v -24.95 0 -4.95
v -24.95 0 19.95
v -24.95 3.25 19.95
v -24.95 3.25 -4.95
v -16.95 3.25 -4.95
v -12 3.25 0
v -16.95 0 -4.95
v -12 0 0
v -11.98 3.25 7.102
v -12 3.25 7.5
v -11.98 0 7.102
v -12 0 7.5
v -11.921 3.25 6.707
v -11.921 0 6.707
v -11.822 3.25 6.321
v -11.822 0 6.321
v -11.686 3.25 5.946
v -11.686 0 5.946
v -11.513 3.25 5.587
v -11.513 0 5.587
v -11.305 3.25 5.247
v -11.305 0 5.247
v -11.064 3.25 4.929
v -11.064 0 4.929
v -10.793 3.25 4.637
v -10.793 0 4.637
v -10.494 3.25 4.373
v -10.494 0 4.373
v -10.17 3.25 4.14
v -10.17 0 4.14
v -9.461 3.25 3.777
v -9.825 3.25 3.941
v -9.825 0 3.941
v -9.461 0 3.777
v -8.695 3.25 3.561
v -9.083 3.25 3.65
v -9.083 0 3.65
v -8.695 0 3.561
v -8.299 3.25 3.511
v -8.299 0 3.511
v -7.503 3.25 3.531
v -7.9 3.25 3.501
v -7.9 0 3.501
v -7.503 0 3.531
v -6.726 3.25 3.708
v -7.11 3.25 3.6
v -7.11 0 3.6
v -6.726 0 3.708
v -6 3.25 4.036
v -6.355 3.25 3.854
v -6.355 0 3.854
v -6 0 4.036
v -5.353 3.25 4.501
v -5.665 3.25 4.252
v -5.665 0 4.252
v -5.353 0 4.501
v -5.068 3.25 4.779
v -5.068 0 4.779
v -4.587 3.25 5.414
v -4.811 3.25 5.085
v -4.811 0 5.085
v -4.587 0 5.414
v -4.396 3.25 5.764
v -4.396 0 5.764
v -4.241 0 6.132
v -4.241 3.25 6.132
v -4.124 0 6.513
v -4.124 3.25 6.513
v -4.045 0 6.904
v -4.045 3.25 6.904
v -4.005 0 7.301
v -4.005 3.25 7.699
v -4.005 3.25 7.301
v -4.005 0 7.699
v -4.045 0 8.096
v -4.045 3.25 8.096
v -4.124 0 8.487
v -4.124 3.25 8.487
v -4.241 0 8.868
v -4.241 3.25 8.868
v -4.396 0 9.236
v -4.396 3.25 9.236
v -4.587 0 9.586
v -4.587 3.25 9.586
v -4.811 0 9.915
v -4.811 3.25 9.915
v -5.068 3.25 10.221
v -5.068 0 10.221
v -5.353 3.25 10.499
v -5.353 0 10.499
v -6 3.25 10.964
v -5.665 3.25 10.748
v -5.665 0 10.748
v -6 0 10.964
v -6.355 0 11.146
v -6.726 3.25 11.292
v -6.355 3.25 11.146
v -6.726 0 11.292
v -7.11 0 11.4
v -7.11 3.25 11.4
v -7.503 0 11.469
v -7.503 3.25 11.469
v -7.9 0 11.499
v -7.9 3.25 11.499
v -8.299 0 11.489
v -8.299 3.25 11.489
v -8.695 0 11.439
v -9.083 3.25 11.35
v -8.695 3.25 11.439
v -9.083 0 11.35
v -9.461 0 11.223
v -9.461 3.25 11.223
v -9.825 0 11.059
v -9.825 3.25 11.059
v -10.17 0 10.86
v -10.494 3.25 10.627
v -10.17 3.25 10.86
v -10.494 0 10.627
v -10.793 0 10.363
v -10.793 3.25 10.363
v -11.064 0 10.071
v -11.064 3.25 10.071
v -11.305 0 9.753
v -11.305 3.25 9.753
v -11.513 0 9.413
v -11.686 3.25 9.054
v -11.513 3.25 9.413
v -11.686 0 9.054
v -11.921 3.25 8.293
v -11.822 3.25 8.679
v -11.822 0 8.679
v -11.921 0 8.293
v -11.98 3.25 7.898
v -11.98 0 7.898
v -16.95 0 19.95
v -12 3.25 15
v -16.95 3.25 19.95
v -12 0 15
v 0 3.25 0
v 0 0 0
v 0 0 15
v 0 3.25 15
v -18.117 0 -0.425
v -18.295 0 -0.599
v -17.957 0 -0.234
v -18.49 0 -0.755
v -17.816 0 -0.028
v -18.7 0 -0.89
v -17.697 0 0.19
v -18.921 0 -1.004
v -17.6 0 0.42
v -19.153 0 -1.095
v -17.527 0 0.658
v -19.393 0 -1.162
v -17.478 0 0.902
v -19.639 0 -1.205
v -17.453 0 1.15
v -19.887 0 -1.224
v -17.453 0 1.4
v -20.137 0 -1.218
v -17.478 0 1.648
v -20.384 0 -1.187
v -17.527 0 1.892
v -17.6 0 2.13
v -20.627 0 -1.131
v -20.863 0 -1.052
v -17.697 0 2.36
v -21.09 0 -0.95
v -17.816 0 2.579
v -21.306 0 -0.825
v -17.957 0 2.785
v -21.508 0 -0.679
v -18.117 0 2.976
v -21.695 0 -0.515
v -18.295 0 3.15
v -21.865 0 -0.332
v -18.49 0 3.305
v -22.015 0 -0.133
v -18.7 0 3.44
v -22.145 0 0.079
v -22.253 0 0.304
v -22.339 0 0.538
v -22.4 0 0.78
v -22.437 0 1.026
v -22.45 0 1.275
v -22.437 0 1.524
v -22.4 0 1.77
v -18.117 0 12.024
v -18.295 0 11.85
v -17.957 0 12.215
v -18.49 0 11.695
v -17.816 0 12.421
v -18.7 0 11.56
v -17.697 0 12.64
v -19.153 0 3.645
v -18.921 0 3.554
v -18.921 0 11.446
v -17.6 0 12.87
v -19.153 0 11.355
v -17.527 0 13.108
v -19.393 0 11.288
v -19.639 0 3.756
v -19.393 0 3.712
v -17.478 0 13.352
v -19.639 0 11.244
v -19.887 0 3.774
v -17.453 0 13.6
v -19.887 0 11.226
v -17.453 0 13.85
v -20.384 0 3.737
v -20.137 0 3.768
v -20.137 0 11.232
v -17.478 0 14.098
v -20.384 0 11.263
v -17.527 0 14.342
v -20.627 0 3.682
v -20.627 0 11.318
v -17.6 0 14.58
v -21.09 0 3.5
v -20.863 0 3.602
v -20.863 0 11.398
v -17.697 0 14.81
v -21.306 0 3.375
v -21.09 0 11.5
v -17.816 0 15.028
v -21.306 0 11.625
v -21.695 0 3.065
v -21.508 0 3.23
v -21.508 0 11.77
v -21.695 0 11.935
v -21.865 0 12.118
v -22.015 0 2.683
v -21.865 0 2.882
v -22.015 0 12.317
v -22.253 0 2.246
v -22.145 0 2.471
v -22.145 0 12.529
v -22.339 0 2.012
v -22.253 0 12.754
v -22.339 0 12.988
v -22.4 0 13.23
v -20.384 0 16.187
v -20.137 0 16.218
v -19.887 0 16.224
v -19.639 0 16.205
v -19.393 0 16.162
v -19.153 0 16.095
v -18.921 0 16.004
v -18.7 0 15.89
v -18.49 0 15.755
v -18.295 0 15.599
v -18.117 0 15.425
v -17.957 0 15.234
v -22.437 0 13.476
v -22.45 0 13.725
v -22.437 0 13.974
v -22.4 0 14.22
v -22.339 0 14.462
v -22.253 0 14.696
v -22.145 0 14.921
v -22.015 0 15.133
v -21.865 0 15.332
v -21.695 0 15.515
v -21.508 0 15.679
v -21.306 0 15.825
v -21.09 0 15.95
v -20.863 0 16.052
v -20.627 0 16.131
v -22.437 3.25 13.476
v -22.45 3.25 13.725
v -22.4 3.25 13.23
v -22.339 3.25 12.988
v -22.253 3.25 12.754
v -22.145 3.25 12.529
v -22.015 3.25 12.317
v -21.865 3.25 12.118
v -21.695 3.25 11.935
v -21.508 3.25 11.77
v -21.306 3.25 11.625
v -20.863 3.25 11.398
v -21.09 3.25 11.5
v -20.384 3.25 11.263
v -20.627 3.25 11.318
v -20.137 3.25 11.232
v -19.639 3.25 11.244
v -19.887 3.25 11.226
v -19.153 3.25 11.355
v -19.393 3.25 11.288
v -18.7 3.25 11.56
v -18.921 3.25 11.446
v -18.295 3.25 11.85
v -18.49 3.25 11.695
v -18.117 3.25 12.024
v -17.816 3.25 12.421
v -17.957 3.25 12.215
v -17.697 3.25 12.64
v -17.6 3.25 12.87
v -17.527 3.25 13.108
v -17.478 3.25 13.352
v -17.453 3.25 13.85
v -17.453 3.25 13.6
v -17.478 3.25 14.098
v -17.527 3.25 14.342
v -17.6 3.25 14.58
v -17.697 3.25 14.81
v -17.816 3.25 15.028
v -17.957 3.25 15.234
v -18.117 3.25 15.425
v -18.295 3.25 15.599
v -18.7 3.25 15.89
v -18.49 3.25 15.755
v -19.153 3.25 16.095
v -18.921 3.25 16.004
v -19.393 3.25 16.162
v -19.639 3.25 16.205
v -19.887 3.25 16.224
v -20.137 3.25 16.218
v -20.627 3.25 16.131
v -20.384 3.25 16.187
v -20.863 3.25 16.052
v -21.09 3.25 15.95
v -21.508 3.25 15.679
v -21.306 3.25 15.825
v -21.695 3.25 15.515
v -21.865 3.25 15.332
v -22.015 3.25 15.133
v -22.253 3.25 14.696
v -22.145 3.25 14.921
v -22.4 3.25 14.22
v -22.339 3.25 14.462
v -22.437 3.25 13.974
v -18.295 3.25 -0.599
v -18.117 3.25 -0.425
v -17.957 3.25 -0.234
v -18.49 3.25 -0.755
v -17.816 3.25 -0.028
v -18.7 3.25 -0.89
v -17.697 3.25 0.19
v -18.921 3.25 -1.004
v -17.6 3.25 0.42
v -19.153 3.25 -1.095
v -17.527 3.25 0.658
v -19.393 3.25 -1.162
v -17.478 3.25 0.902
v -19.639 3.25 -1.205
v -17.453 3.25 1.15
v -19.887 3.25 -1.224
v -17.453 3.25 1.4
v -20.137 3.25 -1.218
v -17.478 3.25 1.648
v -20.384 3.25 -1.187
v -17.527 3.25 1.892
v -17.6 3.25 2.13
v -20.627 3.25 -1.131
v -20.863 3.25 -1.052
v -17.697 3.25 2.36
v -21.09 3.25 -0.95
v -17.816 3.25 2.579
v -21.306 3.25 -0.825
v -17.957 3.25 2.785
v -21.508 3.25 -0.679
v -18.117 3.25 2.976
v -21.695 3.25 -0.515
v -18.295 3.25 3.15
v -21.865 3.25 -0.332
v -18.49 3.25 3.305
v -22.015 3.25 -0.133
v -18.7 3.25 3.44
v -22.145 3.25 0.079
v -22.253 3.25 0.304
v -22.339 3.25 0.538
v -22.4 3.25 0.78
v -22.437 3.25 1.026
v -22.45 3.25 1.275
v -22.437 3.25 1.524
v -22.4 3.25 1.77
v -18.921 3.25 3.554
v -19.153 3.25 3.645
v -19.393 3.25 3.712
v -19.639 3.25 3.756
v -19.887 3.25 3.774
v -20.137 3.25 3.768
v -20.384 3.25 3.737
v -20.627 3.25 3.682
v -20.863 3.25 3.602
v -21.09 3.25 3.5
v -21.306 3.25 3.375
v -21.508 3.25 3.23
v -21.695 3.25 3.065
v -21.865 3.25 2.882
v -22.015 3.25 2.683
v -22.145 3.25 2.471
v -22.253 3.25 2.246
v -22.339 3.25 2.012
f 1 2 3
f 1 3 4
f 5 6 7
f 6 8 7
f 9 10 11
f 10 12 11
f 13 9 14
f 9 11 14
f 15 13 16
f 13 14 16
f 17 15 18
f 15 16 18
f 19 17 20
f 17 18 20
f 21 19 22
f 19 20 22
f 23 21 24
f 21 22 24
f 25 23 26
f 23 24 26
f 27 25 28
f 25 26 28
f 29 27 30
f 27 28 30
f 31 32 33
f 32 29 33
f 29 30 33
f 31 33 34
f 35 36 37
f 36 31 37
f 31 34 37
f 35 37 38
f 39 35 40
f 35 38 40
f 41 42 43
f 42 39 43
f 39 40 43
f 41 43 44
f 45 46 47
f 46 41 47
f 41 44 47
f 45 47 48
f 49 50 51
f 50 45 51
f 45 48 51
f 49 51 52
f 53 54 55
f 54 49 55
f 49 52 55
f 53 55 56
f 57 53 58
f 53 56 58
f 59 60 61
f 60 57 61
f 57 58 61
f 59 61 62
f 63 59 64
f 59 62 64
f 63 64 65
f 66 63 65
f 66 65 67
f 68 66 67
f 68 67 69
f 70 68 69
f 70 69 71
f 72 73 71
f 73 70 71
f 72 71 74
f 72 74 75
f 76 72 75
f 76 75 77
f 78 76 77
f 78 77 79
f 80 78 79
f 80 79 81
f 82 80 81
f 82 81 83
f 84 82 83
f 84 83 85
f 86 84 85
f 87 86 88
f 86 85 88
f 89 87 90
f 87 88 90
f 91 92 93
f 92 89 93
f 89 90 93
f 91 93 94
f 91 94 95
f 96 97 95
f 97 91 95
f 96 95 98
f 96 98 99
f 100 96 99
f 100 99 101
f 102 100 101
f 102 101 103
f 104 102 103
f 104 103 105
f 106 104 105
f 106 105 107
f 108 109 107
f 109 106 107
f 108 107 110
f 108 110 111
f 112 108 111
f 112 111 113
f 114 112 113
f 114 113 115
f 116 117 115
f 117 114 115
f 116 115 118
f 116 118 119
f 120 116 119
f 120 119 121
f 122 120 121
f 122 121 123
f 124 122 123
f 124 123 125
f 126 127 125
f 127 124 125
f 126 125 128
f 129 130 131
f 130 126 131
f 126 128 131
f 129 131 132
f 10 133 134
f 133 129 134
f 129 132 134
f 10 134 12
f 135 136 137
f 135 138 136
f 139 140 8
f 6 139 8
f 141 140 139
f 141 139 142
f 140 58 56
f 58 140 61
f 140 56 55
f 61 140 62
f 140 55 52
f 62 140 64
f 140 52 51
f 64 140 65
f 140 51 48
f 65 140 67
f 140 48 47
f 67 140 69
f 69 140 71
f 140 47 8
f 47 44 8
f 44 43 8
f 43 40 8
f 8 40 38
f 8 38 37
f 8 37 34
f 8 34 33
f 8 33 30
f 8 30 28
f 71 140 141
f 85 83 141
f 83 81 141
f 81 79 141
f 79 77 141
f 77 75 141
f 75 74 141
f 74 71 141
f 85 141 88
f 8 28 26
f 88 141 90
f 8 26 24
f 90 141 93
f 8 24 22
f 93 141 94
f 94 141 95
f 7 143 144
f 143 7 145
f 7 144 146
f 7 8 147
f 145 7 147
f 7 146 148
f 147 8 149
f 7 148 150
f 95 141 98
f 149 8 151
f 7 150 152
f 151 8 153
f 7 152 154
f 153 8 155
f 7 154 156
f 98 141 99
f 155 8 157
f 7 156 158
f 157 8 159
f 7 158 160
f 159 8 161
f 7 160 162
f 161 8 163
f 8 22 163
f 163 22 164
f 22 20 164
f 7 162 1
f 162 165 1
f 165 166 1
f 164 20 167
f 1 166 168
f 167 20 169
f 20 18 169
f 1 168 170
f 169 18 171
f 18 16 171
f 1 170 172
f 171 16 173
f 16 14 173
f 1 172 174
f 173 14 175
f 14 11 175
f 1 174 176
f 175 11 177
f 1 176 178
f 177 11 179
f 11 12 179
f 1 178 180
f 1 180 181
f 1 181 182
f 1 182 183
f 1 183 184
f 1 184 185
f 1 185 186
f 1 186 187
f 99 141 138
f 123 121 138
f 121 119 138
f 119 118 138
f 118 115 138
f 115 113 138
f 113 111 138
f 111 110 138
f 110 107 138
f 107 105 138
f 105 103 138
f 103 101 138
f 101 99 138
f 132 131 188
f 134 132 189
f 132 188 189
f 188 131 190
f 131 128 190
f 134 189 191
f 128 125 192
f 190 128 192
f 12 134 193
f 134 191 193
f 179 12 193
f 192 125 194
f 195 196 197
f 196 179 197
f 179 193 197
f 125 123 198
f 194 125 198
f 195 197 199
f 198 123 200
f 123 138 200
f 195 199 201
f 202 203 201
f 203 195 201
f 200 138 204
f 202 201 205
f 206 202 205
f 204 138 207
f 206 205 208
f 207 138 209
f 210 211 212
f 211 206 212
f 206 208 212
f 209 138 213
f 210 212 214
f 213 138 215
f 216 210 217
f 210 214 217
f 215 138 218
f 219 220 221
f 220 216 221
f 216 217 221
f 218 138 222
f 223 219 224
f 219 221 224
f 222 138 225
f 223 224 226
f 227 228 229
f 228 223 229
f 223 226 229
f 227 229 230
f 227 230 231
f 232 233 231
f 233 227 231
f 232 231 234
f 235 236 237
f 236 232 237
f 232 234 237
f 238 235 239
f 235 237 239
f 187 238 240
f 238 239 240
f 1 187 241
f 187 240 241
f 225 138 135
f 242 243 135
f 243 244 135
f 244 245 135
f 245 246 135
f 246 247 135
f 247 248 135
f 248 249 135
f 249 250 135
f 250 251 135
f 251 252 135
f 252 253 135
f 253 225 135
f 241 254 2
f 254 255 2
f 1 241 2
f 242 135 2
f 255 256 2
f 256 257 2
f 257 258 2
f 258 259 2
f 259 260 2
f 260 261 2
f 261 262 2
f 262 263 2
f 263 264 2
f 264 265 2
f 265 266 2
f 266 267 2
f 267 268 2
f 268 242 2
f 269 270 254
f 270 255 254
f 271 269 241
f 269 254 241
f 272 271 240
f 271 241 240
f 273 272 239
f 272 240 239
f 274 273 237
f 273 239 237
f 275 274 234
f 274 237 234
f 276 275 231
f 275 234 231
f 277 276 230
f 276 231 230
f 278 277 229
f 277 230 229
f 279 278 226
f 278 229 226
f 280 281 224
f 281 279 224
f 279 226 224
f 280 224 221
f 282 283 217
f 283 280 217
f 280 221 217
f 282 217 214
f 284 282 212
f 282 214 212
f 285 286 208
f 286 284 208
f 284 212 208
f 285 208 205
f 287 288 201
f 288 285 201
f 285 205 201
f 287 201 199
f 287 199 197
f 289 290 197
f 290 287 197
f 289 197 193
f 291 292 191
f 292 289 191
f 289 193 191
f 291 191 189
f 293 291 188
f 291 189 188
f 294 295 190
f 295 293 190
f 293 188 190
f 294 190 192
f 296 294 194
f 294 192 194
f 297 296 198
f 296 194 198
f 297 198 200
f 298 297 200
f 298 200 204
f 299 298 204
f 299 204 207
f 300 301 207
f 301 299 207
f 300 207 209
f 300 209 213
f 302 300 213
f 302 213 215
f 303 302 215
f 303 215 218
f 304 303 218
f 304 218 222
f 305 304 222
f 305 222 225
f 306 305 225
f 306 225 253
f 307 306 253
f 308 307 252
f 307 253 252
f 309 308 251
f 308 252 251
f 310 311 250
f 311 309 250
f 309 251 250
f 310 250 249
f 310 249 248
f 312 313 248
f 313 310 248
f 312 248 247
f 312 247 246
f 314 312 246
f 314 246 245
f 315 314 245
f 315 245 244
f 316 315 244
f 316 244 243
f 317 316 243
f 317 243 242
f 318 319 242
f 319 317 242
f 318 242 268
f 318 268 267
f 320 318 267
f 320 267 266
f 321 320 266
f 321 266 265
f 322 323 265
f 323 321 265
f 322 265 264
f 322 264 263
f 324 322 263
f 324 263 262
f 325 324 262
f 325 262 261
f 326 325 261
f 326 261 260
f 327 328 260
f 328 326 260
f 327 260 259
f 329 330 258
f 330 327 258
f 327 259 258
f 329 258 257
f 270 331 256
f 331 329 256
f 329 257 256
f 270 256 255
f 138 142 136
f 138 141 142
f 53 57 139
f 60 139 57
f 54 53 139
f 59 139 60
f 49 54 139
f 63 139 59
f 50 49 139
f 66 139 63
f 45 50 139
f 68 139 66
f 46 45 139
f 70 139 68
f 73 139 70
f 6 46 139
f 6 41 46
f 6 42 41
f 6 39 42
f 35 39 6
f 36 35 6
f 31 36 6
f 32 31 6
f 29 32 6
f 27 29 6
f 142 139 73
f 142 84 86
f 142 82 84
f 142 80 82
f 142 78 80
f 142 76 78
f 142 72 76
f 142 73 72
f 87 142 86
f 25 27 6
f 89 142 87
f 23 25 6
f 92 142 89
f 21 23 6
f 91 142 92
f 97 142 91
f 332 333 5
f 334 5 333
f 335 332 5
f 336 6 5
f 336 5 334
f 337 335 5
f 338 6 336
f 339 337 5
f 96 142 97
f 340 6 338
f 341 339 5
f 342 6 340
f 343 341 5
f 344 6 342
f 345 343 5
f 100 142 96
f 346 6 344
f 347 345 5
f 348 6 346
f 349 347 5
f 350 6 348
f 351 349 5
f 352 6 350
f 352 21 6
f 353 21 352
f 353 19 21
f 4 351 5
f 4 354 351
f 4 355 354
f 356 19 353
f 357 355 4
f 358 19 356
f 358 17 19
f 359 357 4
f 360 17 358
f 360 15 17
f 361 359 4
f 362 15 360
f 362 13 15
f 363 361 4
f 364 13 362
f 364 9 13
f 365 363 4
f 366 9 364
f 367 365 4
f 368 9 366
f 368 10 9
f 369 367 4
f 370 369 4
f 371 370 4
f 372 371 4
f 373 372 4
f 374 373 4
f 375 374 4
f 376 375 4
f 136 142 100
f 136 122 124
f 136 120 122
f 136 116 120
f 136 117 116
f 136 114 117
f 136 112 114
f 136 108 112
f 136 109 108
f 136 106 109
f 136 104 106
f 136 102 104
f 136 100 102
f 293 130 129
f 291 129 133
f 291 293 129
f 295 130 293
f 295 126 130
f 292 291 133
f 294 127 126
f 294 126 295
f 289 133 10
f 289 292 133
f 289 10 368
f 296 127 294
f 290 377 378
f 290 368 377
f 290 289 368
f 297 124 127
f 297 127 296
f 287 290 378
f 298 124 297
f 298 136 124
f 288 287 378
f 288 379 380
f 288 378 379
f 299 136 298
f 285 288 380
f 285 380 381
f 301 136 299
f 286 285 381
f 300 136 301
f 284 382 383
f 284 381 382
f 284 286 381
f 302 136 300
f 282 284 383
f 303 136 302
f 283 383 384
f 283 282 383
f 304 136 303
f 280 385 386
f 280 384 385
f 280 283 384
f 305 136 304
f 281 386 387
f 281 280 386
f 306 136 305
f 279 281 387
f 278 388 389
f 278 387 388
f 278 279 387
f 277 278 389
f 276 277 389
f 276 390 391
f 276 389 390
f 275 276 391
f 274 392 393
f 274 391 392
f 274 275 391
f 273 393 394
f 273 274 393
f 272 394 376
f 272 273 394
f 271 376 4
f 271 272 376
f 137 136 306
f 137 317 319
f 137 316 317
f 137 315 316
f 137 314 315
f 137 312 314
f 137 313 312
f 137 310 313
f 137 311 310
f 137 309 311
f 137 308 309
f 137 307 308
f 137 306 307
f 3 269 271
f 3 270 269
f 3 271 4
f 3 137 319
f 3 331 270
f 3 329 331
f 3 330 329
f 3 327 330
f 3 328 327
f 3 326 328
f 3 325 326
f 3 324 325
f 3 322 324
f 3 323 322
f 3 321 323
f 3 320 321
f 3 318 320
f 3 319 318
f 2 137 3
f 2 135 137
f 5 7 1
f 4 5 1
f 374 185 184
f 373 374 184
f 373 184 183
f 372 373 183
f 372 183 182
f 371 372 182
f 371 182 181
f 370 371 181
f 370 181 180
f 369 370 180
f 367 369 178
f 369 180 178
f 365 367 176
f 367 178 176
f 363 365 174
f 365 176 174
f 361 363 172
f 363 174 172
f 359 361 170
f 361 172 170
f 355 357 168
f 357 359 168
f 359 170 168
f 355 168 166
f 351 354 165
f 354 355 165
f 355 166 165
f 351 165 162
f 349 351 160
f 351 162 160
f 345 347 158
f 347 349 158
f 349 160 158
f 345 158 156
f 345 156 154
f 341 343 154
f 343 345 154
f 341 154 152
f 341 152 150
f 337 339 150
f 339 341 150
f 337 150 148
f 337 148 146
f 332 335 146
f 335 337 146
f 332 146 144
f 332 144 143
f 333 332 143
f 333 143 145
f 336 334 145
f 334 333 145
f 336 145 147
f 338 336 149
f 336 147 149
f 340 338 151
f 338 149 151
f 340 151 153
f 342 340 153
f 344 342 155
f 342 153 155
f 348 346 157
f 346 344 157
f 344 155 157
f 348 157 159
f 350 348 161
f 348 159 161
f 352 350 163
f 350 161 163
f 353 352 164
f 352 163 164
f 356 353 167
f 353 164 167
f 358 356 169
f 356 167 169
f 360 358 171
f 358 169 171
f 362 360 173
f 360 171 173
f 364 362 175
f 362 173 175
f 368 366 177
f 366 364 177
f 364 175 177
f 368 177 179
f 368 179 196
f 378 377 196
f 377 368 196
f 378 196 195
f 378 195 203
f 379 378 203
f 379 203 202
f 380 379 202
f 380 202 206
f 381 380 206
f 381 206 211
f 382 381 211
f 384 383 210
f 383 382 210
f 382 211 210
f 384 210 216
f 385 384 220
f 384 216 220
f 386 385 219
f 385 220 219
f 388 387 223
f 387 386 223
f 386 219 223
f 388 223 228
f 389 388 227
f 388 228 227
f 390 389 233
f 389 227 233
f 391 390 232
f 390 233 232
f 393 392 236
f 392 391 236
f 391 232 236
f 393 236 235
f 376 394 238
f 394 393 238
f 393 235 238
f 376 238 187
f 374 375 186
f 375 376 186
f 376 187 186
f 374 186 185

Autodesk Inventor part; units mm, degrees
ref_plane "YZ Plane" through (0, 0, 0) normal (1, 0, 0) x (0, 1, 0)
ref_plane "XZ Plane" through (0, 0, 0) normal (0, 1, 0) x (-1, 0, 0)
ref_plane "XY Plane" through (0, 0, 0) normal (0, 0, 1) x (1, 0, 0)
sketch "Sketch1" plane through (0, 0, 0) normal (0, 1, 0) x (-1, 0, 0)
  point P0 (0, 0)
sketch "Sketch2" plane through (0, 0, 0) normal (0, 1, 0) x (-1, 0, 0)
  line L0 (0, 0) -> (0, 15)
  line L1 (0, 15) -> (12, 15)
  line L2 (12, 15) -> (16.9497, 19.9497)
  line L3 (12, 15) -> (19, 15) construction
  line L4 (16.9497, 19.9497) -> (24.9497, 19.9497)
  line L5 (0, 7.5) -> (15.5, 7.5) construction
  line L6 (0, 0) -> (12, 0)
  line L7 (12, 0) -> (16.9497, -4.9497)
  line L8 (12, 0) -> (19, 0) construction
  line L9 (16.9497, -4.9497) -> (24.9497, -4.9497)
  line L10 (24.9497, 19.9497) -> (24.9497, -4.9497)
  line L11 (0, 7.5) -> (8, 7.5) construction
  circle A0 centre (8, 7.5) radius 4
  line L12 (24.9497, 7.5) -> (19.9497, 7.5) construction
  line L13 (19.9497, 7.5) -> (19.9497, 19.9497) construction
  circle A1 centre (19.9497, 13.7249) radius 2.5
  line L14 (19.9497, 7.5) -> (19.9497, -4.9497) construction
  circle A2 centre (19.9497, 1.2751) radius 2.5
  dimension "d2" = 15
  dimension "d3" = 12
  dimension "d4" = 7
  dimension "d5" = 45
  dimension "d6" = 8
  dimension "d9" = 8
  dimension "d10" = 8
  dimension "d11" = 5
  dimension "d12" = 5
extrude "Extrusion1" add sketch "Sketch2" along normal blind 3.25 contours L0 L1 L2 L4 L10 L9 L7 L6 | A0 | A1 | A2
extrude "Extrusion2" cut sketch "Sketch2" along normal blind 3.25 contours A0 | A1 | A2
properties part number "union_movllantas"
